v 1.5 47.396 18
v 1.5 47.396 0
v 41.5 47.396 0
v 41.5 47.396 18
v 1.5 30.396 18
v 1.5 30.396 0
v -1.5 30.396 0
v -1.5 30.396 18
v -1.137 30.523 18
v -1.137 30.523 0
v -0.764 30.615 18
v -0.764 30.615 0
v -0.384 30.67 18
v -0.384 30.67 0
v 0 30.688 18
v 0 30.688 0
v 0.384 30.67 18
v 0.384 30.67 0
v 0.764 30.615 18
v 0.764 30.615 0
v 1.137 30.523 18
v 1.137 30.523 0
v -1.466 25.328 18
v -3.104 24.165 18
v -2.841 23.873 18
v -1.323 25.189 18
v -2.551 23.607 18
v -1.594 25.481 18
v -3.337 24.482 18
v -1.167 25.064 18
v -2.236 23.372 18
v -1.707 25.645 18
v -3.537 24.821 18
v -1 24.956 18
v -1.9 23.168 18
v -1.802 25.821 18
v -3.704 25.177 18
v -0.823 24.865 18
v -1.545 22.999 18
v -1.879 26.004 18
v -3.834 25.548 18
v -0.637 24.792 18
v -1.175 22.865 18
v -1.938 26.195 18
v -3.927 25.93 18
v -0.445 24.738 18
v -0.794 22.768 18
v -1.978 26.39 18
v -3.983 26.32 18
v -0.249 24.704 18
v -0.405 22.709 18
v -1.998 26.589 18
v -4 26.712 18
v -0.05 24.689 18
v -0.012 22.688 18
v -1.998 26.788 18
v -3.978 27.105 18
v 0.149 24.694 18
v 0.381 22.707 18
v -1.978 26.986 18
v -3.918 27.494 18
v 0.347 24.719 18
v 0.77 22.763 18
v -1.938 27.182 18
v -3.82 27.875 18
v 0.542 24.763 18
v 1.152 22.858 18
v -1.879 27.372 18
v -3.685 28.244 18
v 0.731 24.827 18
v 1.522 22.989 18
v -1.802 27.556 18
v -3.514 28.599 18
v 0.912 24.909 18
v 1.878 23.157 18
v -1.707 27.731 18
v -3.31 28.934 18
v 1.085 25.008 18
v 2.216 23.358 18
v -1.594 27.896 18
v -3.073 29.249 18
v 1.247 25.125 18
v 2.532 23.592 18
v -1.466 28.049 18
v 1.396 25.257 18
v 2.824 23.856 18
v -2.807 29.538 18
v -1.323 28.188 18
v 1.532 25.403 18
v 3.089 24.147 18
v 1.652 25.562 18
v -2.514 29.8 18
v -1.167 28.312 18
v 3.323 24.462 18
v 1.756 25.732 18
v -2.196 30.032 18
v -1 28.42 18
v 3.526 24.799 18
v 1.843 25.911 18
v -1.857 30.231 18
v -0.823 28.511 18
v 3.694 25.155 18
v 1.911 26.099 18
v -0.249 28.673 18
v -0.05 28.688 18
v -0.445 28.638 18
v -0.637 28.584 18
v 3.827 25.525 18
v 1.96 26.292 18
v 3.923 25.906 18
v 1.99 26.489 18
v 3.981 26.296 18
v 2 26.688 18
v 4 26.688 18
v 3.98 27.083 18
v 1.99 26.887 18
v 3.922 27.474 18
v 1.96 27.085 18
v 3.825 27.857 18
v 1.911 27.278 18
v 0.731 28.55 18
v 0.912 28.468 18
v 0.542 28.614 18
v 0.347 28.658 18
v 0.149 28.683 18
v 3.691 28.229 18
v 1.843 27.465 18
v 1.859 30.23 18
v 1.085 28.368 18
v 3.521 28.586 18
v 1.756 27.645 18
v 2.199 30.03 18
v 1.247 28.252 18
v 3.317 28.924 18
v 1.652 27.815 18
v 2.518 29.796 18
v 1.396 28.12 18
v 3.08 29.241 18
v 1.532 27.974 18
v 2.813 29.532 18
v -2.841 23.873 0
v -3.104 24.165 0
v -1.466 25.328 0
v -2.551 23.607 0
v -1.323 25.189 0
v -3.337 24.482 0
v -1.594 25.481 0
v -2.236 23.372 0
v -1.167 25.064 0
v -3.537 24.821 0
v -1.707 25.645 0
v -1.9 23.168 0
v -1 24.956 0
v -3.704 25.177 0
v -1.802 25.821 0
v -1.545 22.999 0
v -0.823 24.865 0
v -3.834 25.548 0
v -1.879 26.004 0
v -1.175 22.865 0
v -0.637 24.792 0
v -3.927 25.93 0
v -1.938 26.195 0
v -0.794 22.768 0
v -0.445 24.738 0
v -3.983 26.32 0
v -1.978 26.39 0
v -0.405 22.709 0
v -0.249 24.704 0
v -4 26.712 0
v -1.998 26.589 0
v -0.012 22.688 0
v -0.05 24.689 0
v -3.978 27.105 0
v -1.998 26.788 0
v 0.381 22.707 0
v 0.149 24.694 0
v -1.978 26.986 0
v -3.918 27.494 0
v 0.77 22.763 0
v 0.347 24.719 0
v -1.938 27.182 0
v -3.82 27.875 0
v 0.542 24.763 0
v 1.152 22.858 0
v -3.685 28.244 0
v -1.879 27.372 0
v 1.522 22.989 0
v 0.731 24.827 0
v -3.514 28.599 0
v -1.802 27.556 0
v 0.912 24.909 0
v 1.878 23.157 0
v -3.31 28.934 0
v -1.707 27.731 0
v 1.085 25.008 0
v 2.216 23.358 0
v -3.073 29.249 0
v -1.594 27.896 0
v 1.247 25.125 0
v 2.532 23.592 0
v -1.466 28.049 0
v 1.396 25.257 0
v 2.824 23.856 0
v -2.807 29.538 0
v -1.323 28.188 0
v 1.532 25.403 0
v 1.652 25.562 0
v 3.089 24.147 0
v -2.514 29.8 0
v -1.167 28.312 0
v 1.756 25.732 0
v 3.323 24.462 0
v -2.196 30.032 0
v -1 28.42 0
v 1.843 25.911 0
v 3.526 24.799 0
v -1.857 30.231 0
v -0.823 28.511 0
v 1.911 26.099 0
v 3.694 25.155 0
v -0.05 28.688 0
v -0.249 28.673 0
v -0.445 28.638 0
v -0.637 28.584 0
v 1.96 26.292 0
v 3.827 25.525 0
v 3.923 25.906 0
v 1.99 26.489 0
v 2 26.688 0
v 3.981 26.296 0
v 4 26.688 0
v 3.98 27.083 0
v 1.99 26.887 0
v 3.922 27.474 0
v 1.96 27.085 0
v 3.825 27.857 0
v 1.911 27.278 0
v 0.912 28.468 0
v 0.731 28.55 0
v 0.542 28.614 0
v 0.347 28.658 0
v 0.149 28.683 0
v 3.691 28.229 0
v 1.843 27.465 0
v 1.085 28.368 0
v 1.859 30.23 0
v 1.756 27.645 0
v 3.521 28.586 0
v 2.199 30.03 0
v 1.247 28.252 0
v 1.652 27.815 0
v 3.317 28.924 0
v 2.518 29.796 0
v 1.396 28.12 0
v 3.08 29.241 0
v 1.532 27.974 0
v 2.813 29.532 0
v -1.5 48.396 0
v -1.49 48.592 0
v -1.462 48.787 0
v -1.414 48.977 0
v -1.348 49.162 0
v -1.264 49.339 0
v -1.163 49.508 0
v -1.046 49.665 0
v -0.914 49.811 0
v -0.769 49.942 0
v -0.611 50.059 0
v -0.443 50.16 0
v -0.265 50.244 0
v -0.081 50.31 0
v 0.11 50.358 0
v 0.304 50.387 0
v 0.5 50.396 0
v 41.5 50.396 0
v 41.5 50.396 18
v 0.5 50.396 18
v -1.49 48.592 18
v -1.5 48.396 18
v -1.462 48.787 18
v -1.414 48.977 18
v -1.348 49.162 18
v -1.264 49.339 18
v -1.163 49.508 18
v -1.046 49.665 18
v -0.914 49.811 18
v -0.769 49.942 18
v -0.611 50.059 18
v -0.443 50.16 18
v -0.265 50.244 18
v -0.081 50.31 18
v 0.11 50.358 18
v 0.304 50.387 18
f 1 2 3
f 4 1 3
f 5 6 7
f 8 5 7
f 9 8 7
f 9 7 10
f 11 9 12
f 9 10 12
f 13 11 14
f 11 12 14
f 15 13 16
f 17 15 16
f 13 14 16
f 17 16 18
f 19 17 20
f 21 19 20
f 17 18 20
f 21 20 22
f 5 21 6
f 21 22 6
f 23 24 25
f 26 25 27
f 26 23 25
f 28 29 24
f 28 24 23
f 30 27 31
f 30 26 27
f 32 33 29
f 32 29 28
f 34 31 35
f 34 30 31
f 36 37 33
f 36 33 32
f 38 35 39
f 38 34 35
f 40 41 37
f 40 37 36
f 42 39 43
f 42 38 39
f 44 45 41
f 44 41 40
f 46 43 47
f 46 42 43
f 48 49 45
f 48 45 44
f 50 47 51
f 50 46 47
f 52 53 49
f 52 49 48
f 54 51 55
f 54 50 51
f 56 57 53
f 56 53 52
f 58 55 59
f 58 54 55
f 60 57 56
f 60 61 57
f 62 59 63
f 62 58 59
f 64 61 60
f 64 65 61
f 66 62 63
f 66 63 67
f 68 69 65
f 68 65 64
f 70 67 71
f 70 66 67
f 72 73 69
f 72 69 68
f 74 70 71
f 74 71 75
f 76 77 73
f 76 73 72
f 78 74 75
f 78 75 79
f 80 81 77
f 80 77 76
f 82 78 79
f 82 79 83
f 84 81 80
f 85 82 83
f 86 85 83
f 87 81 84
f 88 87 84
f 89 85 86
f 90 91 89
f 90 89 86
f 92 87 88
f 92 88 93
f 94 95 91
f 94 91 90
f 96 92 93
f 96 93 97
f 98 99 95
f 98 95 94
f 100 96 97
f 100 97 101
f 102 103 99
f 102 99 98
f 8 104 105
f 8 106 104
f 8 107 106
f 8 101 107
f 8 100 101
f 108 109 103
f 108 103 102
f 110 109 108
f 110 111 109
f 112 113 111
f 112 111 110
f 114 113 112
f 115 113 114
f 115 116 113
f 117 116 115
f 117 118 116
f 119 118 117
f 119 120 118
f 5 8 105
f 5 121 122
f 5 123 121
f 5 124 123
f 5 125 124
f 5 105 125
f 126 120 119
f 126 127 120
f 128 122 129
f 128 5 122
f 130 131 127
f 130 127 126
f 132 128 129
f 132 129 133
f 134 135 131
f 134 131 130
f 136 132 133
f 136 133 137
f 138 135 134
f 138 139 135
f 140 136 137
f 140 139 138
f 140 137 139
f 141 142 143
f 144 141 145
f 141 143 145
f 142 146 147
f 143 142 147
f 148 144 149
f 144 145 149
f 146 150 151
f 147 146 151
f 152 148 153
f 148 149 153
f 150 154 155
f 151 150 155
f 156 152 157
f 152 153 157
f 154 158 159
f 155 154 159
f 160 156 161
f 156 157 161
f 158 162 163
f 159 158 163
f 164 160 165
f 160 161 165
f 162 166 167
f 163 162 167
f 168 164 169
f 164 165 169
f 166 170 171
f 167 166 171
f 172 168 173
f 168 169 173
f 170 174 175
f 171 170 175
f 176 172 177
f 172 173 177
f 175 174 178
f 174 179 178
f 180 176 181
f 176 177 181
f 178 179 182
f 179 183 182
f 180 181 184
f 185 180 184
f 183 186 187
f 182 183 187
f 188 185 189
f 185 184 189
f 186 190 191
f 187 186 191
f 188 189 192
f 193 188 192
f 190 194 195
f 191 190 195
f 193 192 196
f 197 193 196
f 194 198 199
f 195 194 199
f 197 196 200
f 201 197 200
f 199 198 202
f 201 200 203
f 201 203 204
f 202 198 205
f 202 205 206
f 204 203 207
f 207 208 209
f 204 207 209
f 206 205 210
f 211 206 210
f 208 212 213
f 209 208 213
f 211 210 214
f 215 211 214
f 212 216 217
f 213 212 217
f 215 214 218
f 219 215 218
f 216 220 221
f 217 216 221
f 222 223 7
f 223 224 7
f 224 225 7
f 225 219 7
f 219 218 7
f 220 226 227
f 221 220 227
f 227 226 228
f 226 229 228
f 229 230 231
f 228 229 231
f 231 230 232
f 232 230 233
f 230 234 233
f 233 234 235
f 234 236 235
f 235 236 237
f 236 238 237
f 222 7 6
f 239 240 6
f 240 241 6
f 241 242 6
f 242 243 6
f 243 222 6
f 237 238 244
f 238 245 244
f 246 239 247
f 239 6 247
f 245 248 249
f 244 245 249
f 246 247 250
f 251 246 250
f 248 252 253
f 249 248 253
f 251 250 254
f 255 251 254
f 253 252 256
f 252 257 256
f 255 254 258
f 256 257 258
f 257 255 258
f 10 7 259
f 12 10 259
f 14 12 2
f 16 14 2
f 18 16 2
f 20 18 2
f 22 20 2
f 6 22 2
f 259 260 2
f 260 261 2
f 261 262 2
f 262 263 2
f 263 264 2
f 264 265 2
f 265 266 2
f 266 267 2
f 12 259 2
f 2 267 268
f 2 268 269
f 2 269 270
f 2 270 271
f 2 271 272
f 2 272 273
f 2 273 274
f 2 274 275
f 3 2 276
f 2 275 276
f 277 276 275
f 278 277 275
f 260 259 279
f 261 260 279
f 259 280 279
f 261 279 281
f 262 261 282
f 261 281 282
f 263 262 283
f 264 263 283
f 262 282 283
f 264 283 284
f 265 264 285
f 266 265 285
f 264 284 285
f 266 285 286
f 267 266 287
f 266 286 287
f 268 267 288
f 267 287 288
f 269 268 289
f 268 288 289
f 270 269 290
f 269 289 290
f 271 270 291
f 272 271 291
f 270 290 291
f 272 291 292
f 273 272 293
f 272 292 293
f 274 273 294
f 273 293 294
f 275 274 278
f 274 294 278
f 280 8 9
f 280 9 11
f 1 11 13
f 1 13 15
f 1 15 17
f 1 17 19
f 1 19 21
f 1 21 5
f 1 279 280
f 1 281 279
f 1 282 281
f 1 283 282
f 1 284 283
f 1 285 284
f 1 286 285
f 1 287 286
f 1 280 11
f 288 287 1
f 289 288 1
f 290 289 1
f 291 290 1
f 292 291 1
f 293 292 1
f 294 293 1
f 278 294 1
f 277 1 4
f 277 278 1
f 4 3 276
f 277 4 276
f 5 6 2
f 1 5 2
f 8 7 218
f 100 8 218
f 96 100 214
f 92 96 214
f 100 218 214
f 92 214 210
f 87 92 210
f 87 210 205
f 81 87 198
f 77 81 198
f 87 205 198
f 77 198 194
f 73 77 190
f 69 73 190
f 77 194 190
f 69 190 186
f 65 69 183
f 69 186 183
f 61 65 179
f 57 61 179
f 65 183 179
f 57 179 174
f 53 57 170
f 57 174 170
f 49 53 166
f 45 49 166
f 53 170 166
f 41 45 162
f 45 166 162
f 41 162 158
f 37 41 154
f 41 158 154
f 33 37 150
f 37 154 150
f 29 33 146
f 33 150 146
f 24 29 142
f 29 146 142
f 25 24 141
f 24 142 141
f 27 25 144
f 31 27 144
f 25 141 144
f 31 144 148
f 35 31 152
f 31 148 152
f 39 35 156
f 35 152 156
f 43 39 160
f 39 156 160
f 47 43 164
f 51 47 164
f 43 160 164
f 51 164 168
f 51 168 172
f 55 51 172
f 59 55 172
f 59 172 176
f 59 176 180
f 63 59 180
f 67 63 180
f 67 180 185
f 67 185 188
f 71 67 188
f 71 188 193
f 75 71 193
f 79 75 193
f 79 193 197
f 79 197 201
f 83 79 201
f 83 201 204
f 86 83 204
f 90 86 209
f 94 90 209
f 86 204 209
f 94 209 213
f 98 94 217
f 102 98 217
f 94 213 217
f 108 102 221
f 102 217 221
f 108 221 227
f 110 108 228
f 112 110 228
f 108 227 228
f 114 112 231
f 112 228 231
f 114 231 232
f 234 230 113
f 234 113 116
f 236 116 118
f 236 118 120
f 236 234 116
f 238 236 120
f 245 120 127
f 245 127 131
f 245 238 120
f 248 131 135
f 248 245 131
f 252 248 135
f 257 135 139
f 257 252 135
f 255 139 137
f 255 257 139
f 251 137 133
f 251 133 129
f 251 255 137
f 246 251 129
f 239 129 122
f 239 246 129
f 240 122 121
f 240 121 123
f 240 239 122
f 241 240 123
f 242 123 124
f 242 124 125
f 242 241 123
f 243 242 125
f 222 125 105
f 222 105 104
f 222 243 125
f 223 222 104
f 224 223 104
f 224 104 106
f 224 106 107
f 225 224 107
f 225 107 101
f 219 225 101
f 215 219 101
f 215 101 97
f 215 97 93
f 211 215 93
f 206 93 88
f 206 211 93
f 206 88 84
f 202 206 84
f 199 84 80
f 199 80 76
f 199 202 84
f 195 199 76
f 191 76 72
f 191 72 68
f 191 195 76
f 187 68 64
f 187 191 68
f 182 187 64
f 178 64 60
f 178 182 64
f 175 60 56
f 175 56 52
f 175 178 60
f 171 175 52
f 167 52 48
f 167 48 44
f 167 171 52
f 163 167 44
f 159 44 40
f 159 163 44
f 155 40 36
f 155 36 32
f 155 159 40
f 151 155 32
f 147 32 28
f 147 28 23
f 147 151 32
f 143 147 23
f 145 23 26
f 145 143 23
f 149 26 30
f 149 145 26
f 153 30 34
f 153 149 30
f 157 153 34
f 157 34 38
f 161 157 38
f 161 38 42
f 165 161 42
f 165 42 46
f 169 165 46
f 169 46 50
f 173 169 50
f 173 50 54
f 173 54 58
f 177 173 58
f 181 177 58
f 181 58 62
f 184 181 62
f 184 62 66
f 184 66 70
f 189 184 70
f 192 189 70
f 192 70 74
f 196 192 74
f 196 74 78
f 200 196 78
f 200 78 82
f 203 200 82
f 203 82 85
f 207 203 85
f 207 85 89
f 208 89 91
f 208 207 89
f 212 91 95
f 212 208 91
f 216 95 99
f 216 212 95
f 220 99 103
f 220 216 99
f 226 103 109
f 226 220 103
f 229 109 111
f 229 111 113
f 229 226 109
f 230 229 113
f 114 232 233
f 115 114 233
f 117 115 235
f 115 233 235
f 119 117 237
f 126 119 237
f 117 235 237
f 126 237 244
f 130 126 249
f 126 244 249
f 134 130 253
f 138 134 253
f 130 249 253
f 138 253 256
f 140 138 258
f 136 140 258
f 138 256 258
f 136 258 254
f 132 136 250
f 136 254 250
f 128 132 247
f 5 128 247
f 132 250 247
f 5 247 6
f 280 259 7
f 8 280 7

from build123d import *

# Parameters (mm, degrees)
BOSS_EXTRUDE1_DEPTH   = 18
SKETCH1_R             = 2
BOSS_EXTRUDE1_2_DEPTH = 18
FILLET1_R             = 2


with BuildPart() as part:
    # Sketch1 → Boss-Extrude1 (new body)
    with BuildSketch(Plane.XY):
        with BuildLine():
            Line((-1.5, 50.396439737), (-1.5, 30.396439737))
            ThreePointArc((-1.5, 30.396439737), (0, 30.688340494), (1.5, 30.396439737))
            Line((1.5, 30.396439737), (1.5, 47.396439737))
            Line((1.5, 47.396439737), (41.5, 47.396439737))
            Line((41.5, 47.396439737), (41.5, 50.396439737))
            Line((41.5, 50.396439737), (1.5, 50.396439737))
            Line((1.5, 50.396439737), (-1.5, 50.396439737))
        make_face()
    extrude(amount=BOSS_EXTRUDE1_DEPTH)

    # Fillet1
    fillet1_edges = [part.edges().sort_by_distance(p)[0] for p in [
        (-1.5, 50.396439737, 9),
    ]]
    fillet(fillet1_edges, radius=FILLET1_R)


with BuildPart() as body_2:
    # Sketch1 → Boss-Extrude1 2 (new body)
    with BuildSketch(Plane.XY):
        with BuildLine():
            Line((1.5, 30.396439737), (-1.5, 30.396439737))
            ThreePointArc((-1.5, 30.396439737), (-2.236067977, 23.371715703), (4, 26.688340494))
            ThreePointArc((4, 26.688340494), (3.31662479, 28.924408471), (1.5, 30.396439737))
        make_face()
        with Locations((0, 26.688340494)):
            Circle(SKETCH1_R, mode=Mode.SUBTRACT)
    extrude(amount=BOSS_EXTRUDE1_2_DEPTH)


solid = Compound([part.part, body_2.part])
